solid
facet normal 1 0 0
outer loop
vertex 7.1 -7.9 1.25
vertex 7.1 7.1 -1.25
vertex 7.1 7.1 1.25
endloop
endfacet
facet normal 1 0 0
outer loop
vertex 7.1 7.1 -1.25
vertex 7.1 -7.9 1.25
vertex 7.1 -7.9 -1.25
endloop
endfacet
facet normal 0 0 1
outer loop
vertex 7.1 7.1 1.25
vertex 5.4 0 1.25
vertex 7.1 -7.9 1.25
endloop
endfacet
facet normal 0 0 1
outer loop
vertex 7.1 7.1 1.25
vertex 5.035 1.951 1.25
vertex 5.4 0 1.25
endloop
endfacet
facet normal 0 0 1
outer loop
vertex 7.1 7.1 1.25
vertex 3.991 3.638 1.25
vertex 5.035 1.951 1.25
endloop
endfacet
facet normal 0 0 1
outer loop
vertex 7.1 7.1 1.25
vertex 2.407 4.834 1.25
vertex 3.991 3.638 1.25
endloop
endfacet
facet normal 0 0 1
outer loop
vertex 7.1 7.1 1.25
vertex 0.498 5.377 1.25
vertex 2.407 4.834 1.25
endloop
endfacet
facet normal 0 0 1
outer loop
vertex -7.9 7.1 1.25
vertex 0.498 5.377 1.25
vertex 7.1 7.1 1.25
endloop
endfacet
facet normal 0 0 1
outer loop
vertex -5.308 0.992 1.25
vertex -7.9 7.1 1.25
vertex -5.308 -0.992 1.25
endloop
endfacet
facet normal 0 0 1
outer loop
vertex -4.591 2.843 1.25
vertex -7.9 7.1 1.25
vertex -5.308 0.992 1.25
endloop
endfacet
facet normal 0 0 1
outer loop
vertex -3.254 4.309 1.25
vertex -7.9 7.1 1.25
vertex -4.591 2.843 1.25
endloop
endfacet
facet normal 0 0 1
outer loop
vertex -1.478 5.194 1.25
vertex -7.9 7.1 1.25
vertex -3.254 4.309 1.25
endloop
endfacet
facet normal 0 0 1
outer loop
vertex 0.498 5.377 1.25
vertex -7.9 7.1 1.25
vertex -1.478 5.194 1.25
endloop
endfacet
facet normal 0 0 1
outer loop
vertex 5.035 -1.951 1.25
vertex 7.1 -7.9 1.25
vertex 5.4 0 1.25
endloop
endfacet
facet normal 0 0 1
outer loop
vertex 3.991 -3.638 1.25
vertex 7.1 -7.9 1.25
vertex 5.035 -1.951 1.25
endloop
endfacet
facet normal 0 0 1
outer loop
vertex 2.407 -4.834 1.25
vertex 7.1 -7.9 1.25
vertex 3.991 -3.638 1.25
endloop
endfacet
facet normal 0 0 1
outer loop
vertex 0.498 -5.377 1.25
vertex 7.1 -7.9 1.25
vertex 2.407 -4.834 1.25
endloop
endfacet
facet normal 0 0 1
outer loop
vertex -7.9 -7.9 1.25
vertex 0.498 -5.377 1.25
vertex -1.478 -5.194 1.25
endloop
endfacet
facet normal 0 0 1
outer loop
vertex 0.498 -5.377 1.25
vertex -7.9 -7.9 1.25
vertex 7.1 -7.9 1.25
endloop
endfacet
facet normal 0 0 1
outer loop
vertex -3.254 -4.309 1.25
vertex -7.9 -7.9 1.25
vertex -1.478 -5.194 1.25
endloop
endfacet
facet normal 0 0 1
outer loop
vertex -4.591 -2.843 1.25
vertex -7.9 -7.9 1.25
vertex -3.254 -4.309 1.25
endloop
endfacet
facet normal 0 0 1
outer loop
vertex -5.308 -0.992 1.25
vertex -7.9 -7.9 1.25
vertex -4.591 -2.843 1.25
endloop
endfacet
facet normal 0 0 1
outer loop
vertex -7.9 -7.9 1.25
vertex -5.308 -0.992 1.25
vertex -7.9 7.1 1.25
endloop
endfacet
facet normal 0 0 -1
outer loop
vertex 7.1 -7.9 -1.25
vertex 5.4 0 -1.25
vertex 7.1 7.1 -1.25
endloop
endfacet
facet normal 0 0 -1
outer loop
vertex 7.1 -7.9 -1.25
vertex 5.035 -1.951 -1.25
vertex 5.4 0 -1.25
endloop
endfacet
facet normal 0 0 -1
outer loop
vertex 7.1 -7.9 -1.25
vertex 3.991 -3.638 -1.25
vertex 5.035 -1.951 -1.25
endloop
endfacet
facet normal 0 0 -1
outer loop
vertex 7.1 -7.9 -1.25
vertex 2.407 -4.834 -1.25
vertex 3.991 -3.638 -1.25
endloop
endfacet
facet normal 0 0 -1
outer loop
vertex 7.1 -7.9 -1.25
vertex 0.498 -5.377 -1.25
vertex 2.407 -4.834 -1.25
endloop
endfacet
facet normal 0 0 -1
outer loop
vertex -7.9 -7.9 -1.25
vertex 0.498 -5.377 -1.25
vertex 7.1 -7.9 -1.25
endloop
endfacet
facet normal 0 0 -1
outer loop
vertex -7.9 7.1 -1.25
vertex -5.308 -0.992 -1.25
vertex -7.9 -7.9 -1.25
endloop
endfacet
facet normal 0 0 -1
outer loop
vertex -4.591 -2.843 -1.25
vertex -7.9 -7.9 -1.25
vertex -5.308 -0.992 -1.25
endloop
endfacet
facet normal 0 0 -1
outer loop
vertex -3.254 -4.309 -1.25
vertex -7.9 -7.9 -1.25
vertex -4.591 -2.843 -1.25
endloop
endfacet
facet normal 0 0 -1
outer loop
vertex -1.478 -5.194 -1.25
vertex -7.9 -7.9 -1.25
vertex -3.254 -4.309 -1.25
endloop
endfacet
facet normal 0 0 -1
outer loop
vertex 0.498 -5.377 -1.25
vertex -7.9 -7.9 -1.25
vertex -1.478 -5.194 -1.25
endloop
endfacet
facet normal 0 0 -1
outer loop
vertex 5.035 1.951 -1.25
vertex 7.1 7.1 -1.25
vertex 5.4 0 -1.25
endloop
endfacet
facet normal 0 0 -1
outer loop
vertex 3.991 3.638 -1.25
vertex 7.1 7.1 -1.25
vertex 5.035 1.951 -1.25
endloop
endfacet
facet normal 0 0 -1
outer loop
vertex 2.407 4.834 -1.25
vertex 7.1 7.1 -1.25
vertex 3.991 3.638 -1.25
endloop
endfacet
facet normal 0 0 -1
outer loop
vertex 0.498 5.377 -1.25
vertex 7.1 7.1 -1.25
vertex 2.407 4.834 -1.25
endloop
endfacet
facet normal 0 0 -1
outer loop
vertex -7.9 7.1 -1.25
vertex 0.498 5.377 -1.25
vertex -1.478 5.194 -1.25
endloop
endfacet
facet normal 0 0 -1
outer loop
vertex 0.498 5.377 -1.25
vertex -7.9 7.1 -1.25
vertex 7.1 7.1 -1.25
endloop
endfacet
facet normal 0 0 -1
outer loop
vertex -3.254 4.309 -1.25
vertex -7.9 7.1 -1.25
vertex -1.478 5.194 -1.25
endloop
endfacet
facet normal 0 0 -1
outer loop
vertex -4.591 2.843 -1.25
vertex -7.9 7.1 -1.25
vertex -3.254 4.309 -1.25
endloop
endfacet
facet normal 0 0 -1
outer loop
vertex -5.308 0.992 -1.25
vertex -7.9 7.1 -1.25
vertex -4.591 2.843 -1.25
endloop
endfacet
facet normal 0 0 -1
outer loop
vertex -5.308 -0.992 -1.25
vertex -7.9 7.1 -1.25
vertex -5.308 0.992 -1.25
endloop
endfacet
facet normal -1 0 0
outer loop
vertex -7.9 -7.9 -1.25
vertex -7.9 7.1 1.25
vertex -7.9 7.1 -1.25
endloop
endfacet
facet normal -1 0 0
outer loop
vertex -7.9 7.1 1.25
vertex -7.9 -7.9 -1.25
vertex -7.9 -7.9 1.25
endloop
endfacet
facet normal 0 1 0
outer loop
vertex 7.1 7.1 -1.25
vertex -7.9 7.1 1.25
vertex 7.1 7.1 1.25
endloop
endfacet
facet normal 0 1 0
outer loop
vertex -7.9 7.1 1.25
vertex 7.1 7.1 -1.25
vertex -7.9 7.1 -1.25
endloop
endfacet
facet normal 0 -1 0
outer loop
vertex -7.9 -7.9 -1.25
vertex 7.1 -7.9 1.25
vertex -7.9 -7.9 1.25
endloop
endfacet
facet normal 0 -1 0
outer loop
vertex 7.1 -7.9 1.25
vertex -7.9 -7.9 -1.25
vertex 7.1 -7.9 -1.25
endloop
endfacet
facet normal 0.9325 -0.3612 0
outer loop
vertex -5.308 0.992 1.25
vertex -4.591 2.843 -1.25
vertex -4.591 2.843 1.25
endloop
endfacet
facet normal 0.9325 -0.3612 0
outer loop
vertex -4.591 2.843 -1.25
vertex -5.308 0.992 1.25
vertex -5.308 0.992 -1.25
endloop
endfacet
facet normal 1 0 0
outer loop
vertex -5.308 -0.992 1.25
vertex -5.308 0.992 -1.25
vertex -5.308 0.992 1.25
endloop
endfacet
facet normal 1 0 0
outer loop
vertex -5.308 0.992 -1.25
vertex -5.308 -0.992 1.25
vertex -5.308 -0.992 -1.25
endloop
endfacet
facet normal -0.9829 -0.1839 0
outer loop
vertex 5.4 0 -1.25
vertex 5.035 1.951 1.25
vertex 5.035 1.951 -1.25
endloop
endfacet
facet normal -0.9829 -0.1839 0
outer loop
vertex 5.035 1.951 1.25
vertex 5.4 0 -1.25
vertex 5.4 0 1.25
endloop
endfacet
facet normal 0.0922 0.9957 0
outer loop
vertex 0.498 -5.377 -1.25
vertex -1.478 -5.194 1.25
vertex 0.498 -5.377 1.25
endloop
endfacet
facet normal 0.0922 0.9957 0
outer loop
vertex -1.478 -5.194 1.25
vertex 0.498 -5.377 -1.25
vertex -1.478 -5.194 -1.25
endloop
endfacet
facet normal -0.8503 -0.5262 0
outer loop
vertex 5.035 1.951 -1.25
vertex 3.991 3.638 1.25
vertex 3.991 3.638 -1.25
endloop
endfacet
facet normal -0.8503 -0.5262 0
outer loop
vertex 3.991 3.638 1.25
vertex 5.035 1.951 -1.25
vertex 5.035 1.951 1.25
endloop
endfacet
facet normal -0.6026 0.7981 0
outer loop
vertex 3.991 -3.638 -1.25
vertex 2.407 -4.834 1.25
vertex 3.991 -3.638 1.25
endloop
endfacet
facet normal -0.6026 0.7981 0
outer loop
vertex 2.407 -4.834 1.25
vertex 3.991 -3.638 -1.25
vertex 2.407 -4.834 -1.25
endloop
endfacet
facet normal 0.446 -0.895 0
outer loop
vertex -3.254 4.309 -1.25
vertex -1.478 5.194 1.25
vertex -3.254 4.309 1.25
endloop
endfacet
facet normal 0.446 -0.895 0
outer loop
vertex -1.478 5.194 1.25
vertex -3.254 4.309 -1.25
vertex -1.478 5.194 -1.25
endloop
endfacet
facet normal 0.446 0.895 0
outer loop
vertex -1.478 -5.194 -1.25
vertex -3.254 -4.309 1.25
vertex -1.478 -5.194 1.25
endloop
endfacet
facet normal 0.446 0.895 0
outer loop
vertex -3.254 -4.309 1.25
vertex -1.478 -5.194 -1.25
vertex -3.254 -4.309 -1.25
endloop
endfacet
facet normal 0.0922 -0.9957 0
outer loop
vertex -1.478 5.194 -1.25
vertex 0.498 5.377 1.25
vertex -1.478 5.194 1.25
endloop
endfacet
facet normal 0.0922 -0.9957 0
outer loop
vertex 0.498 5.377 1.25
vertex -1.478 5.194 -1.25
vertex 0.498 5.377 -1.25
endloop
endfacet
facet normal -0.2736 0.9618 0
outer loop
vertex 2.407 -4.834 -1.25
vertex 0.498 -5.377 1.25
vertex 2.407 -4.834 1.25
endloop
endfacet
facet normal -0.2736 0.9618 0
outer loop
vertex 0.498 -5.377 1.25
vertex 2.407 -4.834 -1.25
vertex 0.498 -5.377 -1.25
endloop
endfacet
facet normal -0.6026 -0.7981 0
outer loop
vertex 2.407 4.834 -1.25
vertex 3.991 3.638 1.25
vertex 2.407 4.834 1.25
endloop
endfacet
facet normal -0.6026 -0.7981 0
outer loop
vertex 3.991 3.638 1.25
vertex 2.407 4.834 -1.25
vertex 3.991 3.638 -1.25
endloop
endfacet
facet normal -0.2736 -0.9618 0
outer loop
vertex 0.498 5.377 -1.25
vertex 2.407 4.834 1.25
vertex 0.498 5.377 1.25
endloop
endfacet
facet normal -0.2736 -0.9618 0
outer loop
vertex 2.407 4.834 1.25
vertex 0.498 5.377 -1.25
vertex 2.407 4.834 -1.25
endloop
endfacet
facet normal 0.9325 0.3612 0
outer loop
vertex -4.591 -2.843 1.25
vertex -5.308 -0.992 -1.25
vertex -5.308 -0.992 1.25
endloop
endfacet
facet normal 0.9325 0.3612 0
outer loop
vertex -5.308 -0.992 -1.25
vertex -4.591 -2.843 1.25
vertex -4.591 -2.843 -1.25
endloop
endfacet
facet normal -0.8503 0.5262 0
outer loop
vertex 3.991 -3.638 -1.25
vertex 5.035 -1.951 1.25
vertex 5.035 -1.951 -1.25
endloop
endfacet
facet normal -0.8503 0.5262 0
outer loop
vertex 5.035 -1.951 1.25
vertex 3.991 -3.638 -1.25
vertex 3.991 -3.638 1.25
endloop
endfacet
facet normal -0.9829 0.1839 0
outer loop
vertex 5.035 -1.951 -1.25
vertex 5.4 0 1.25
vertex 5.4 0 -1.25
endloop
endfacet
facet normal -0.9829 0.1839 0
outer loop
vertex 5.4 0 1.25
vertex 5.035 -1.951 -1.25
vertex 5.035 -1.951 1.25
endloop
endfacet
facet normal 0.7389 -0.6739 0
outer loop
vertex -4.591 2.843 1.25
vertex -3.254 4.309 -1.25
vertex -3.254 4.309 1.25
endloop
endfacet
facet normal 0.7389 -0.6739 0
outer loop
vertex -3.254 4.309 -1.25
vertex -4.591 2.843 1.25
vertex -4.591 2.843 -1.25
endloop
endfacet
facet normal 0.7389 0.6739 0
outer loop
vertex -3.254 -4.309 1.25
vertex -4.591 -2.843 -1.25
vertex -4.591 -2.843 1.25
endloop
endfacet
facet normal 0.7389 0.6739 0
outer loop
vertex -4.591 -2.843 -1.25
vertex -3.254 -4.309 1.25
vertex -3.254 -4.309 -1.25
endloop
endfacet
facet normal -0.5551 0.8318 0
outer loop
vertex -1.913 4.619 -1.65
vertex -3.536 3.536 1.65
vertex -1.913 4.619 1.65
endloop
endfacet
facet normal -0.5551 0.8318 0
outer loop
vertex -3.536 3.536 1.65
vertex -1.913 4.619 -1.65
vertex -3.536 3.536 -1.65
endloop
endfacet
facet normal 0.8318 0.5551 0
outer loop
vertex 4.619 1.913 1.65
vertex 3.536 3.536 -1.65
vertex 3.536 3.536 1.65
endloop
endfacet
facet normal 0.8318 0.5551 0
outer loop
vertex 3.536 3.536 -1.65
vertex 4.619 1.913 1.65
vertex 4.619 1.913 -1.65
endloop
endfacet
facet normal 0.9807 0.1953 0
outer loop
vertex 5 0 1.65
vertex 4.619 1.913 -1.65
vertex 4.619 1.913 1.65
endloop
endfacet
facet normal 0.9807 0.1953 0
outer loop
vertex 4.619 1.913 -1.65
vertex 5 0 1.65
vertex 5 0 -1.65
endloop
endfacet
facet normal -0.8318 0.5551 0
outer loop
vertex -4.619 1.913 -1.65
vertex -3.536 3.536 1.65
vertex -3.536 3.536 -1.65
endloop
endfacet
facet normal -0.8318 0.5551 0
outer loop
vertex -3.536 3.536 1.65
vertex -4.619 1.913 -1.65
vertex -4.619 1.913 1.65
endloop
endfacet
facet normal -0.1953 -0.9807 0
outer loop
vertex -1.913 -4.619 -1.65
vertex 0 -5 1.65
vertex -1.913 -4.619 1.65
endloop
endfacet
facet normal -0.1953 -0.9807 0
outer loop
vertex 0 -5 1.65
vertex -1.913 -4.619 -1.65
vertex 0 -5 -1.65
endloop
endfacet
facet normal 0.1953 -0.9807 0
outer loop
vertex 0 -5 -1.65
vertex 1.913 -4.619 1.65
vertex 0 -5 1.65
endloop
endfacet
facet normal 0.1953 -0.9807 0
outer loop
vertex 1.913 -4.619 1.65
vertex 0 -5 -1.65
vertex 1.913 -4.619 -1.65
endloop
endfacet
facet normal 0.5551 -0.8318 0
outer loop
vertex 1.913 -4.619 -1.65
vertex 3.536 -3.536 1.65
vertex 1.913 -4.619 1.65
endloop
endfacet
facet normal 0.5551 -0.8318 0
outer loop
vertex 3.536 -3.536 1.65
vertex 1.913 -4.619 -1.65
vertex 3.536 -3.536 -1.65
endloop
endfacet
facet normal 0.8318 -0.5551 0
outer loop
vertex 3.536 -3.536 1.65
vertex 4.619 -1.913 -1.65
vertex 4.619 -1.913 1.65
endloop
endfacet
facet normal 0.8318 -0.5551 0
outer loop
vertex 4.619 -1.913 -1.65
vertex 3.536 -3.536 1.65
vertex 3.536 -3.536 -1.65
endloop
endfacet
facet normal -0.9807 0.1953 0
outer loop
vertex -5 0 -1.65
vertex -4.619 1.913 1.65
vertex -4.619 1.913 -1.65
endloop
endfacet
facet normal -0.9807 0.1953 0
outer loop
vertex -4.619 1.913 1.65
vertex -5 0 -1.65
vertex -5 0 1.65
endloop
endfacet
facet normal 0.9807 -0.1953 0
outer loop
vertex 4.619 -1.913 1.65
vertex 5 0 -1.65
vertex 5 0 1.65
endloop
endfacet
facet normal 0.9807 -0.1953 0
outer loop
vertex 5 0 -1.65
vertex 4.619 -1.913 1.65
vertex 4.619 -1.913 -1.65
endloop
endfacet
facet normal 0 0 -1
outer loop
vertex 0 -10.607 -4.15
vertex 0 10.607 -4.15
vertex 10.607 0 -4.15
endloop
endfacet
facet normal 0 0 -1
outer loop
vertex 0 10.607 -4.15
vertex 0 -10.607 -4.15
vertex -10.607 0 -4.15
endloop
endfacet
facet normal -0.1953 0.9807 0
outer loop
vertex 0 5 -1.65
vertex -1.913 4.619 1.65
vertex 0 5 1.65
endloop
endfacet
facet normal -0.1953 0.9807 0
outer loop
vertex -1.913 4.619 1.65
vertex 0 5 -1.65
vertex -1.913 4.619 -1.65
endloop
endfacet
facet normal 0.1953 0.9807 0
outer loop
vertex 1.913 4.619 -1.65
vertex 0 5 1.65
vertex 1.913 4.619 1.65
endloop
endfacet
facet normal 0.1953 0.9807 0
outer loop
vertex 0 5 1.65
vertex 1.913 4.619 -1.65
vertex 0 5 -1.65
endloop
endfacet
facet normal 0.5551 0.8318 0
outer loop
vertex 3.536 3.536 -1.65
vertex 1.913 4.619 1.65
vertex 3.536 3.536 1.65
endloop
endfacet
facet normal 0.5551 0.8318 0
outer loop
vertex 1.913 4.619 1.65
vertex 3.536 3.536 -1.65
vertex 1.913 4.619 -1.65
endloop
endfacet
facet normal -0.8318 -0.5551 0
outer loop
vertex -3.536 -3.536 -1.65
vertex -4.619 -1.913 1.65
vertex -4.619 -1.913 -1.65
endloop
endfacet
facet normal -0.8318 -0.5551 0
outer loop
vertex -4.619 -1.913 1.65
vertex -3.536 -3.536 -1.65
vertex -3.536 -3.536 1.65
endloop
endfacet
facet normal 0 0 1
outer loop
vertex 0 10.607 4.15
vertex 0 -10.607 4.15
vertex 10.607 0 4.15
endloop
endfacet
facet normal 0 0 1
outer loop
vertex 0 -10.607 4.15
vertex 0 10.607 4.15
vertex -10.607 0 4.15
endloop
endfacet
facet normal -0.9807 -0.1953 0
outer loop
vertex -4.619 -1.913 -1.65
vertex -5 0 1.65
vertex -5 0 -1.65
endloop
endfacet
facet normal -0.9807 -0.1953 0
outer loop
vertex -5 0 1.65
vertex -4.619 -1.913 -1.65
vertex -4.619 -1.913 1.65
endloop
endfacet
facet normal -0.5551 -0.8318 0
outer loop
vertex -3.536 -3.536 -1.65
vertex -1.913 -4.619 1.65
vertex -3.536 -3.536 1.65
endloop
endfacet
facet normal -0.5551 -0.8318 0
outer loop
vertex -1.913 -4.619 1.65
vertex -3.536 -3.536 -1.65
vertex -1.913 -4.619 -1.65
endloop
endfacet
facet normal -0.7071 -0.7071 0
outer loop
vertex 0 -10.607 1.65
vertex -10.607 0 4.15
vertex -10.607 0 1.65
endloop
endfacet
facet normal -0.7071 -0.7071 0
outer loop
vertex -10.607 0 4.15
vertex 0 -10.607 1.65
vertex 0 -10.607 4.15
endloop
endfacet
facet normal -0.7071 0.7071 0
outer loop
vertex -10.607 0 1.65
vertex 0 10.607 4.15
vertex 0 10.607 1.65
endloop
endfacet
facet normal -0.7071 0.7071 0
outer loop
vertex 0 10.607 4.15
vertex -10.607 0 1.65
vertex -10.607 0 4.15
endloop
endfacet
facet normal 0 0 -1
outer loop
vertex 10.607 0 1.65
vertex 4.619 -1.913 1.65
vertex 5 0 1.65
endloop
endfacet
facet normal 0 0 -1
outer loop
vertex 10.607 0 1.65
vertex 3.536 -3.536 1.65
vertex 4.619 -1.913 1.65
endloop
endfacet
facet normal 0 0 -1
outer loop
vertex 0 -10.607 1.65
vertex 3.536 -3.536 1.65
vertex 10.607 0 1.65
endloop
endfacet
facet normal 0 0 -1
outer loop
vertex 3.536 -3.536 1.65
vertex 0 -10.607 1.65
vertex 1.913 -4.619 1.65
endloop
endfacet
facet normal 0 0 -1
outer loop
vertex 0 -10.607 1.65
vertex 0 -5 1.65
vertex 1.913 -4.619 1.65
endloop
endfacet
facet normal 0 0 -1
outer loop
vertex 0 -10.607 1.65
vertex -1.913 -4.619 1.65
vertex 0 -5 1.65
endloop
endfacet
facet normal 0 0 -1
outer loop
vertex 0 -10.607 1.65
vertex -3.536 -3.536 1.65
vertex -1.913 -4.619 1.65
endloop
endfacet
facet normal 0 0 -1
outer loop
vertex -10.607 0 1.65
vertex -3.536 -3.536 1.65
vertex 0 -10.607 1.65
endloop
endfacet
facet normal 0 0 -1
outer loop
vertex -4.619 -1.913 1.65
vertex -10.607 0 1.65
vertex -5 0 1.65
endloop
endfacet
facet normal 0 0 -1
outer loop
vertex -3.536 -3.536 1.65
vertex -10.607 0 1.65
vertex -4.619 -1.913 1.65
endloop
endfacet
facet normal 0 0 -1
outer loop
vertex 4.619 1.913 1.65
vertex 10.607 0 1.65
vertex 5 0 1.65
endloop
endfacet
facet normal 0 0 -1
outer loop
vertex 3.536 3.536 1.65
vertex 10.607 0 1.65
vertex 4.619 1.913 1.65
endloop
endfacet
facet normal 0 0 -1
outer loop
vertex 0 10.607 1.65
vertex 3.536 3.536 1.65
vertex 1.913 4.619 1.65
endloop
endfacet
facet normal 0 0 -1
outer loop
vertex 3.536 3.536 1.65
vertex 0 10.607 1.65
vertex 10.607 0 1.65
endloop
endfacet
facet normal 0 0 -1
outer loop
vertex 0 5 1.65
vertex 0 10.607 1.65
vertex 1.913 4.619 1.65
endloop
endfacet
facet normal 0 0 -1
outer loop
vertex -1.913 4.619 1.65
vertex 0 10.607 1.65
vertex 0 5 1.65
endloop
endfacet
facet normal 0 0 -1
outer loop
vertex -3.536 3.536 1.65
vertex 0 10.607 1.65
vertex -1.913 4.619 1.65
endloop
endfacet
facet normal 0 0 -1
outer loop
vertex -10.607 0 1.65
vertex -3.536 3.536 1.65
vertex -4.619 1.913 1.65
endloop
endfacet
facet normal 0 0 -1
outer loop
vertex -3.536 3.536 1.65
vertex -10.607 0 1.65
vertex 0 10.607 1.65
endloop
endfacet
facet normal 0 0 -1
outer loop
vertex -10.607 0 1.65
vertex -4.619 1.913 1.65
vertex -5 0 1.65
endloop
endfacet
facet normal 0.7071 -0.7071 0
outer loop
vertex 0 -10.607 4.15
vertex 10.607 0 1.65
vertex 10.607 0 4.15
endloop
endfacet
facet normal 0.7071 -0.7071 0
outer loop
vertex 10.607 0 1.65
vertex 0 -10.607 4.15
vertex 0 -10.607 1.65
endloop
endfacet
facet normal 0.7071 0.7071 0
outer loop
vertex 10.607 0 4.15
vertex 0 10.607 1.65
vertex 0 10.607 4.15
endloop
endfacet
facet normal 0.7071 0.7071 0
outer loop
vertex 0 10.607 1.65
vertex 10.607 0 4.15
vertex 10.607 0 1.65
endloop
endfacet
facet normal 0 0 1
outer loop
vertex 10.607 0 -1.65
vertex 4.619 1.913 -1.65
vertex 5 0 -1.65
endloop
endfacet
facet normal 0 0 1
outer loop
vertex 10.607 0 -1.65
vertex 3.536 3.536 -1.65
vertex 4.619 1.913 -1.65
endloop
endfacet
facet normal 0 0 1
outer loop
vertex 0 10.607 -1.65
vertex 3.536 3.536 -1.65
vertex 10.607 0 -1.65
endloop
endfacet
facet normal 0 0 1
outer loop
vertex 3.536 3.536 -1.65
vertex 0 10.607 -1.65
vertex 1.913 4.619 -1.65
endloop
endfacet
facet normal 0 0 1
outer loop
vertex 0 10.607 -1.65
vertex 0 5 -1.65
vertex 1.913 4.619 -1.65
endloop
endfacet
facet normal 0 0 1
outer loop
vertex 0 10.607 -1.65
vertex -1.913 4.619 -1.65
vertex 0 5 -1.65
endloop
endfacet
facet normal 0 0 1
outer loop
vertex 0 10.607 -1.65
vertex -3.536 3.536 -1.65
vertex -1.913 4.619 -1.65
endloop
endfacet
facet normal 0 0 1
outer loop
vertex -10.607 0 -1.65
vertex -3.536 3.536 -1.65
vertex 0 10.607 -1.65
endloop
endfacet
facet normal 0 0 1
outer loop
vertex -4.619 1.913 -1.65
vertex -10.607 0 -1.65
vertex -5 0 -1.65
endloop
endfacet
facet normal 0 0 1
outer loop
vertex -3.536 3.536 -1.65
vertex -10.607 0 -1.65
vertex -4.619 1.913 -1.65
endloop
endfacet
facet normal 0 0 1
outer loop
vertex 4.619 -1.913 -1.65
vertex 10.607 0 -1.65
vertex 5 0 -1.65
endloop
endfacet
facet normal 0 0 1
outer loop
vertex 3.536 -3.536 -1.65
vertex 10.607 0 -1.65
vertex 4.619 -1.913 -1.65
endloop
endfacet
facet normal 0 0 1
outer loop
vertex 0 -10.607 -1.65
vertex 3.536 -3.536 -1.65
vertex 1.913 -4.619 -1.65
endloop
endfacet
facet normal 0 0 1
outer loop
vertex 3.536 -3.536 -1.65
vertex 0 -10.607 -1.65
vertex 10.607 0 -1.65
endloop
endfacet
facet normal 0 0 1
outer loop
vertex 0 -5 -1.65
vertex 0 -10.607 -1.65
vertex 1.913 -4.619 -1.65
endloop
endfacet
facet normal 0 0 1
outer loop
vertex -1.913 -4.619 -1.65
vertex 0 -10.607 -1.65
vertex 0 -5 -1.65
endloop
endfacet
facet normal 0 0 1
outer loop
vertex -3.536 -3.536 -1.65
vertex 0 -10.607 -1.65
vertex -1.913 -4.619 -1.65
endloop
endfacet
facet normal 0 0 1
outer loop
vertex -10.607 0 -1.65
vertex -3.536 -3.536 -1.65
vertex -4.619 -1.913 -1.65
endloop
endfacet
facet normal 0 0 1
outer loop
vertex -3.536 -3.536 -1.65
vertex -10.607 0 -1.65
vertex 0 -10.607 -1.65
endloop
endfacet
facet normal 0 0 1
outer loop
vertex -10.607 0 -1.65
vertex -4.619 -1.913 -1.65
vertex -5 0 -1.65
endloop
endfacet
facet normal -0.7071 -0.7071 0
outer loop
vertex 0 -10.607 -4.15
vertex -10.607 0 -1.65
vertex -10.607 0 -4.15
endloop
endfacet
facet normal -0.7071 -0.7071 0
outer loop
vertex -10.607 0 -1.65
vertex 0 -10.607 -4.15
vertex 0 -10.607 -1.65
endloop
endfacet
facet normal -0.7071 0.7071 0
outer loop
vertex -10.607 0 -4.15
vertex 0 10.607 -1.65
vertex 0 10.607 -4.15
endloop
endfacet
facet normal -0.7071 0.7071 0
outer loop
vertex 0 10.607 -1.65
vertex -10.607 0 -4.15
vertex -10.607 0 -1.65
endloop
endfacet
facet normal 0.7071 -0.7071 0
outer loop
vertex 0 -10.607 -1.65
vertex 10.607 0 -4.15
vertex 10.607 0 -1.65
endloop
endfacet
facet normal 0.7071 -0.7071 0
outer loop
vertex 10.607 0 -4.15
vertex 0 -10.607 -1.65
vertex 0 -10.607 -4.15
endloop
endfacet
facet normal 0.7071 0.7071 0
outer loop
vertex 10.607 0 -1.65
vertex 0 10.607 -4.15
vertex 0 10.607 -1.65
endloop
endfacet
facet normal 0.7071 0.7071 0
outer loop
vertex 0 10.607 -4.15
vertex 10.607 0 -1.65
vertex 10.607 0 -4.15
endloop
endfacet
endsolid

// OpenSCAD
//created by ivanchaos
//this is a test thing for dissolvable material dual-extrusion
//change the "gap" value according to your printer's nozzle diameter for suitable test object. 



cubeEdgeSize = 5;
sectionHeight=2.5;
pivotPillarSize =5;
gap=0.4;	//measured in mm


difference(){
translate([-cubeEdgeSize/2-gap-pivotPillarSize,-cubeEdgeSize/2-gap-pivotPillarSize,-sectionHeight*0.5])cube([cubeEdgeSize+2*pivotPillarSize,cubeEdgeSize+2*pivotPillarSize,sectionHeight]);
cylinder(sectionHeight,pivotPillarSize+gap,pivotPillarSize+gap,true);}
union(){
cylinder(sectionHeight*3+gap*2,pivotPillarSize,pivotPillarSize,true);



rotate([0,0,45])translate([-cubeEdgeSize/2-pivotPillarSize,-cubeEdgeSize/2-pivotPillarSize,sectionHeight*0.5+gap])cube([cubeEdgeSize+2*pivotPillarSize,cubeEdgeSize+2*pivotPillarSize,sectionHeight]);

rotate([0,0,45])translate([-cubeEdgeSize/2-pivotPillarSize,-cubeEdgeSize/2-pivotPillarSize,-sectionHeight*1.5-gap])cube([cubeEdgeSize+2*pivotPillarSize,cubeEdgeSize+2*pivotPillarSize,sectionHeight]);
}
